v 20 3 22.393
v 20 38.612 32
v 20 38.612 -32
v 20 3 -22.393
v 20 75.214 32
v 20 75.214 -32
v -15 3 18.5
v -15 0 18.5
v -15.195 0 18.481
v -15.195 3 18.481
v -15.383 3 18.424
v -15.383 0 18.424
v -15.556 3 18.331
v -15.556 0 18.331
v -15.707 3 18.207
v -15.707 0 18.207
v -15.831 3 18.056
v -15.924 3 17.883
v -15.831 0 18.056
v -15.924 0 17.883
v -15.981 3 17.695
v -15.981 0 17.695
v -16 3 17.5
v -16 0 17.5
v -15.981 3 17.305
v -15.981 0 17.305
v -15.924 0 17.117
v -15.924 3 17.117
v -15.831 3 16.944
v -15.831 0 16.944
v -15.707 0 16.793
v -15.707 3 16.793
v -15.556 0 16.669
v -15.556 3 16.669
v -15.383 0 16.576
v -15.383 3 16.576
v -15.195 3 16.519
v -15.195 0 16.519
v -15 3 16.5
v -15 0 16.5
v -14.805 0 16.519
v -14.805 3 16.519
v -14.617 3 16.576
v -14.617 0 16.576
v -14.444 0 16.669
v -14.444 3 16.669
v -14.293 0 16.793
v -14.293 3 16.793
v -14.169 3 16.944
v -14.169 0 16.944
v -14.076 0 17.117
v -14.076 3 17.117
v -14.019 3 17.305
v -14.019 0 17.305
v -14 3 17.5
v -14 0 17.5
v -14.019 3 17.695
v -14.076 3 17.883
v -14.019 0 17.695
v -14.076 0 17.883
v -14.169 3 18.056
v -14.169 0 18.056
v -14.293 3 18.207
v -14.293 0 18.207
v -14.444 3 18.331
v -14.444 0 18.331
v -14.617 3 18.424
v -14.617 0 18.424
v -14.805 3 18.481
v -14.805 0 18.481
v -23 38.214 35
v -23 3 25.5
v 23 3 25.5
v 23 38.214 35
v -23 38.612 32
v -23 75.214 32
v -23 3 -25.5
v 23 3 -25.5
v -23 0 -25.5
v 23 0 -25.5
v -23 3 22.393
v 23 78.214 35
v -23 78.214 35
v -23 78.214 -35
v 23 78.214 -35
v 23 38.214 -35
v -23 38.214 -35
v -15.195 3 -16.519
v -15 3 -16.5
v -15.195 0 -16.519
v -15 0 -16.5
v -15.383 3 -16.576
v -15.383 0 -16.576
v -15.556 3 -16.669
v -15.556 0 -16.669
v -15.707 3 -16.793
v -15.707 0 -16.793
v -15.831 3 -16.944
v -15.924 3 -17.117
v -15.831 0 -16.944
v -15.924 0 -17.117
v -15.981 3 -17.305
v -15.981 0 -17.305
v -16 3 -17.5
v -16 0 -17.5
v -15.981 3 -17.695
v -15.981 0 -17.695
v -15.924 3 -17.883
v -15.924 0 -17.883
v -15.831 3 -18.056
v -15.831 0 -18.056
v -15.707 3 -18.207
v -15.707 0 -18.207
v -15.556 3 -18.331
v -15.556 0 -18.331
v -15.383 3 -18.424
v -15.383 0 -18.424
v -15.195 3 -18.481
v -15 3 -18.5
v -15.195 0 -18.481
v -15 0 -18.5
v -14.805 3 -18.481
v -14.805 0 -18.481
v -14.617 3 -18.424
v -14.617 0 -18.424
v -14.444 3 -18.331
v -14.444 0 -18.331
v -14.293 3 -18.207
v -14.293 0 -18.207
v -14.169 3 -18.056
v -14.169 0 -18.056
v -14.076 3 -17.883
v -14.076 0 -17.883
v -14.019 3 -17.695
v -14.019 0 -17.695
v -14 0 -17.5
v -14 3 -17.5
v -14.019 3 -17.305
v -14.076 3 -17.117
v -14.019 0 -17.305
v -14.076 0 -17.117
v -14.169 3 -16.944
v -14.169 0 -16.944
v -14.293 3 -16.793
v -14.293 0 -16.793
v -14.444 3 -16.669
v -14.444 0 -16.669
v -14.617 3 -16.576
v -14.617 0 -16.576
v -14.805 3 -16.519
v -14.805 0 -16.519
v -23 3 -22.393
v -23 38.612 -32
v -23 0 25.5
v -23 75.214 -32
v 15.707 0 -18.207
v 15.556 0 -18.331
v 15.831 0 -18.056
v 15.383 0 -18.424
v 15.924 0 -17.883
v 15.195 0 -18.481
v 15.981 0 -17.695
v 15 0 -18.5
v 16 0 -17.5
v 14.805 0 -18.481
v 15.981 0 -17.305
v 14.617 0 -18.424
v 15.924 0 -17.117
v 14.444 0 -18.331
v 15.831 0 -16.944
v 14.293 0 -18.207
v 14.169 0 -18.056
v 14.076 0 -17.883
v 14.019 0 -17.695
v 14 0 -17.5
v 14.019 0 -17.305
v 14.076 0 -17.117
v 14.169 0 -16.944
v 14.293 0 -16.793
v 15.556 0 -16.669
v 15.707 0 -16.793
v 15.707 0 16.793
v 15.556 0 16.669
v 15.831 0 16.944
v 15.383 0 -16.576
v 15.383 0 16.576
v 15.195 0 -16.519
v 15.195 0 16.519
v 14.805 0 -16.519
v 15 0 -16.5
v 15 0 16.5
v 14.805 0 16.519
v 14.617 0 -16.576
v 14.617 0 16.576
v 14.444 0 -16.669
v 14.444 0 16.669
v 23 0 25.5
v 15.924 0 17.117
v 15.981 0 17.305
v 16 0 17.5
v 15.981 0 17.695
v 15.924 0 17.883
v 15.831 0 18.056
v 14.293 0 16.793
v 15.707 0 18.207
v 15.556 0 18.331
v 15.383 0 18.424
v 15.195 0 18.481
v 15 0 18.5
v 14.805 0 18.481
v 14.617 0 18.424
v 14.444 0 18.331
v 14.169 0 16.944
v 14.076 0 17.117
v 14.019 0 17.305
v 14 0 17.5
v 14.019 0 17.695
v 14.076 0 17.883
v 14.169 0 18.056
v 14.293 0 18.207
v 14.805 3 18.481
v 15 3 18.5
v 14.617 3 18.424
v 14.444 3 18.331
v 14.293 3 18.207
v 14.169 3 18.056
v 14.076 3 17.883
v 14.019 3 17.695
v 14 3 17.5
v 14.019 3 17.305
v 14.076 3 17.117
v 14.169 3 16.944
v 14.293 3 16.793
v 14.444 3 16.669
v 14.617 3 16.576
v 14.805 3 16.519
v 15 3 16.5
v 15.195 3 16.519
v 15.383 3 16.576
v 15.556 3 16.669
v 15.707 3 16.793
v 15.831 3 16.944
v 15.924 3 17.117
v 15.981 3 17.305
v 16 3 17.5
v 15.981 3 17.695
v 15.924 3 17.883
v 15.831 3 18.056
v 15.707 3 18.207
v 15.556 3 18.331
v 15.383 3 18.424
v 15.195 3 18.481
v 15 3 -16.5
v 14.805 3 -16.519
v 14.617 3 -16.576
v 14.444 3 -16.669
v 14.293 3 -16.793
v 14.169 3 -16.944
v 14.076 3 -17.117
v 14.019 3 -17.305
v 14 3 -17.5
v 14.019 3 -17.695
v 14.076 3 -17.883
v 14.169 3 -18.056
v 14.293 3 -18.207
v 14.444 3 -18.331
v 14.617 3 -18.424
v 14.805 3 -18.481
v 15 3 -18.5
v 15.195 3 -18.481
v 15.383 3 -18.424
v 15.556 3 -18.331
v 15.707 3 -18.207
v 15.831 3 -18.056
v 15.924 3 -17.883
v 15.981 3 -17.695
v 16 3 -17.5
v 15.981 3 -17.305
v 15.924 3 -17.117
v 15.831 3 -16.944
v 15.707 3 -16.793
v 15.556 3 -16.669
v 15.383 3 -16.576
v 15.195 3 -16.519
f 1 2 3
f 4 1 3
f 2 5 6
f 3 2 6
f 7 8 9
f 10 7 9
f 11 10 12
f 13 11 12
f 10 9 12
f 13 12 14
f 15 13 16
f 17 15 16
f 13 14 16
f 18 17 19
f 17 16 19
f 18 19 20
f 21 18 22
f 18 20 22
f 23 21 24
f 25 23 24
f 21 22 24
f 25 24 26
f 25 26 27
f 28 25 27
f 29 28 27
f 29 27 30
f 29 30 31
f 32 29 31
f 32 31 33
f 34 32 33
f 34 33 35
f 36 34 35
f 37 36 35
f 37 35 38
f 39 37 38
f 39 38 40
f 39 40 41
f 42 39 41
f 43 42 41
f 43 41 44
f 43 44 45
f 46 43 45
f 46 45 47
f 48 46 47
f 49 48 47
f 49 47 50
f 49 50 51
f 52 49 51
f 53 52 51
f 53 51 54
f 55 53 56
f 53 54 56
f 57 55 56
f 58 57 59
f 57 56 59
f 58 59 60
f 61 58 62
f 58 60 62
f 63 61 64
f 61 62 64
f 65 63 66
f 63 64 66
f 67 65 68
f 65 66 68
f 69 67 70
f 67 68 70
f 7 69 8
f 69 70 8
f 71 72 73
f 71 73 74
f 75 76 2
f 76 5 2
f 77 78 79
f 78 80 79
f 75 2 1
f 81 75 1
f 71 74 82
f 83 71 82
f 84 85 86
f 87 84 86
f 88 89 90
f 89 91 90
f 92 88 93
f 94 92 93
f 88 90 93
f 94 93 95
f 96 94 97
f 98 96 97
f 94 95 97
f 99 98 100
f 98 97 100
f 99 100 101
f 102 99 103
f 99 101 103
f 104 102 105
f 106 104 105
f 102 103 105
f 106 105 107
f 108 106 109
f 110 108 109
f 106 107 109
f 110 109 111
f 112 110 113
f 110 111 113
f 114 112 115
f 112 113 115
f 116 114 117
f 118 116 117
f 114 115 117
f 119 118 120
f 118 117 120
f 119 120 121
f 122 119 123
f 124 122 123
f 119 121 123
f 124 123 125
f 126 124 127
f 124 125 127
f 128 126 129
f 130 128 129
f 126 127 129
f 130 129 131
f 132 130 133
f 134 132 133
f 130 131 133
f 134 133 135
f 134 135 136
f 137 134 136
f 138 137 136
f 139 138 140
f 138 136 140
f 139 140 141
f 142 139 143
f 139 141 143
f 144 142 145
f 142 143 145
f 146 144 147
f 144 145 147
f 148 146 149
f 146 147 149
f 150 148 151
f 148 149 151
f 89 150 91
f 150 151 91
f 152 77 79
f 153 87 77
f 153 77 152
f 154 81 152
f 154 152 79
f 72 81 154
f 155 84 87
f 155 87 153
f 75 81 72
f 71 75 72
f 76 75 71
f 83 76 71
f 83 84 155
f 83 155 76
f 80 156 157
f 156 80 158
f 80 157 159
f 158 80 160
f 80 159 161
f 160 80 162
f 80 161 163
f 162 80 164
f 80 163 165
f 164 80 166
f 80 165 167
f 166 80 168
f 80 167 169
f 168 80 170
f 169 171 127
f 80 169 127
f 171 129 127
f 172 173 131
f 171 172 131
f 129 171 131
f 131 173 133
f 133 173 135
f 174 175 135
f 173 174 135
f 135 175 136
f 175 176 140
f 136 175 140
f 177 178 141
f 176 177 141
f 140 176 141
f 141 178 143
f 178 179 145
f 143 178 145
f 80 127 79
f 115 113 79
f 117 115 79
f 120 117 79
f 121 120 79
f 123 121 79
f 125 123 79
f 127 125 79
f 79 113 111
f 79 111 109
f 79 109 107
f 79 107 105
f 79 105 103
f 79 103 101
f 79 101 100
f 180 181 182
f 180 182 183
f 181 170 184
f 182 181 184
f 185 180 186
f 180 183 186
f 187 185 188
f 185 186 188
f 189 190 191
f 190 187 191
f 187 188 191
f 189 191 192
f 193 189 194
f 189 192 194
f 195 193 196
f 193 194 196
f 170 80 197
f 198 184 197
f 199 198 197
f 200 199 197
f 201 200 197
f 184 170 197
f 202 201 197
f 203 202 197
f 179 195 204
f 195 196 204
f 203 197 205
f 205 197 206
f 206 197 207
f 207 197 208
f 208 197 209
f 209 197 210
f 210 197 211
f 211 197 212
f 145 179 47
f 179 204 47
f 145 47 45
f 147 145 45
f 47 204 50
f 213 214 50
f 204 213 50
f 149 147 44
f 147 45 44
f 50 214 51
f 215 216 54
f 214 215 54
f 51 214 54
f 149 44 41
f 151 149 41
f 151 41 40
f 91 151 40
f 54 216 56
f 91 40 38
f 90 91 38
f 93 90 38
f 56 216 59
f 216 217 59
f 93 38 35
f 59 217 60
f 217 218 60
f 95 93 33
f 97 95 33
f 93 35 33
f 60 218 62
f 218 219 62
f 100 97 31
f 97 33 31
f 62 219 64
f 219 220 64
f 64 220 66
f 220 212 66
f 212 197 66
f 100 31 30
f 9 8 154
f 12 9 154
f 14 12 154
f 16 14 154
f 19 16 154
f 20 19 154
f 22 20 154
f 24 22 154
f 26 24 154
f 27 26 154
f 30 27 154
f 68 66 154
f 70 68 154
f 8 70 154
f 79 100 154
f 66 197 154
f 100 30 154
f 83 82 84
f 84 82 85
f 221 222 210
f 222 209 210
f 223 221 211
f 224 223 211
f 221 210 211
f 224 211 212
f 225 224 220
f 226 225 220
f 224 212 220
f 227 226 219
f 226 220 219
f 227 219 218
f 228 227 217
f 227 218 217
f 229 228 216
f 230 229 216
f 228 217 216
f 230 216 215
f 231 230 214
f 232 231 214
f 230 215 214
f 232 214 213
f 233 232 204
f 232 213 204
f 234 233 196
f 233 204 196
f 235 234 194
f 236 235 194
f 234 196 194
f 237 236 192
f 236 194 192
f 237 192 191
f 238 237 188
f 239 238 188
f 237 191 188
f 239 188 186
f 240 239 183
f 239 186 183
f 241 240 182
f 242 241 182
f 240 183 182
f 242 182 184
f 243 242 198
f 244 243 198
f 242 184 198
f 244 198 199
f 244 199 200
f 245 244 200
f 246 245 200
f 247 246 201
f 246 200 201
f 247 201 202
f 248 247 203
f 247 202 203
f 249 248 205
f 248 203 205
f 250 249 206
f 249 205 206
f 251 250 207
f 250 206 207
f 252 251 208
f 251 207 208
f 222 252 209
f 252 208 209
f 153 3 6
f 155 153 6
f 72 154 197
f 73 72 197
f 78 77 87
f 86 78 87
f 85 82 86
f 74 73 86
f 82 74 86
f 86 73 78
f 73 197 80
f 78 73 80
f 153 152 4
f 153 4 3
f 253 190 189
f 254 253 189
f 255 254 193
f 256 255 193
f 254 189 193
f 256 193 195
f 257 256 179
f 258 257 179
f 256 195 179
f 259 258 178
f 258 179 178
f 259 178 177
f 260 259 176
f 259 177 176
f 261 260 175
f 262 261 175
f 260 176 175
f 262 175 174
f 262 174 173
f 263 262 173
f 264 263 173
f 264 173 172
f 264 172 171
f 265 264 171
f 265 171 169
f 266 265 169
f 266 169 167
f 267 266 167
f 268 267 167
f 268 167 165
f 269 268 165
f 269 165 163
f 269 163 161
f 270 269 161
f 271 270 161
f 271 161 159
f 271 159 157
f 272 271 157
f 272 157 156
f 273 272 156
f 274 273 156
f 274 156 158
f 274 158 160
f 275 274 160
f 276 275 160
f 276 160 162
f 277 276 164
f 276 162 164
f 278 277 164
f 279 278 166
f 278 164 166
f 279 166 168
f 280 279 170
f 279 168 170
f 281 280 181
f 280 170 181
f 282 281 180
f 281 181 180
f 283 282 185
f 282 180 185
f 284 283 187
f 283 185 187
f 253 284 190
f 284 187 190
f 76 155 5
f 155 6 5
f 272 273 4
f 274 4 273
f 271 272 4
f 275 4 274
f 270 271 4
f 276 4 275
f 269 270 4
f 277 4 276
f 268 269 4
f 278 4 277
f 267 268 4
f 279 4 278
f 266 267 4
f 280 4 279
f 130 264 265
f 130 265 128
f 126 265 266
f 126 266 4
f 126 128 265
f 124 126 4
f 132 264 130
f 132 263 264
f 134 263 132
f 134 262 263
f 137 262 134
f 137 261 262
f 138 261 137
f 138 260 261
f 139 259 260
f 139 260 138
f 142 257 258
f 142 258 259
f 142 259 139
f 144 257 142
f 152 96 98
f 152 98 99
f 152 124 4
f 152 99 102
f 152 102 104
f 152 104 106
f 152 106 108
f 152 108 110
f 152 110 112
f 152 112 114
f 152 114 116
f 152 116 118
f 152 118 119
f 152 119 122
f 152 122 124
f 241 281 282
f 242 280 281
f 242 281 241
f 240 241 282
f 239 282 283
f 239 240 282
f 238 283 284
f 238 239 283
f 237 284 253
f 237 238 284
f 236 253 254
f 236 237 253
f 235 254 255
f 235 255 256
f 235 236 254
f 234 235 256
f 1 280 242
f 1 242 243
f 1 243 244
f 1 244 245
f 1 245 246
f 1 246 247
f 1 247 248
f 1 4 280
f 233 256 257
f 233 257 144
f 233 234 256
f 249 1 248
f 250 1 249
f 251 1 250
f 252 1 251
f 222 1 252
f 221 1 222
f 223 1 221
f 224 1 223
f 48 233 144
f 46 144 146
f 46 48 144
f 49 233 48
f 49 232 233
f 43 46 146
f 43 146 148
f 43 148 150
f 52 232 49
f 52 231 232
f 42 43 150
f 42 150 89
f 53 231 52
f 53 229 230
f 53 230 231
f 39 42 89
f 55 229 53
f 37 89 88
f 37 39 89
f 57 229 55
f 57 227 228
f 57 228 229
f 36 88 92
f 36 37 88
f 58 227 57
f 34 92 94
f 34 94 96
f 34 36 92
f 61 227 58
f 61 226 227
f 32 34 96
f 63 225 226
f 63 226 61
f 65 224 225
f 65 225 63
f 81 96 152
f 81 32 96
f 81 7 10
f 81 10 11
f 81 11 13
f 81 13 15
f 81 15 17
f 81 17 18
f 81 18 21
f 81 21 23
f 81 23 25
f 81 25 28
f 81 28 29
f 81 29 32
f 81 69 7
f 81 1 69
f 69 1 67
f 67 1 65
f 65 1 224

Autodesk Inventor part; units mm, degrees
ref_plane "YZ Plane" through (0, 0, 0) normal (1, 0, 0) x (0, 1, 0)
ref_plane "XZ Plane" through (0, 0, 0) normal (0, 1, 0) x (-1, 0, 0)
sketch "Sketch1" plane through (0, 0, 0) normal (0, 1, 0) x (-1, 0, 0)
  line L0 (23, 25.5) -> (-23, 25.5)
  line L1 (-23, 25.5) -> (-23, -25.5)
  line L2 (-23, -25.5) -> (23, -25.5)
  line L3 (23, -25.5) -> (23, 25.5)
  point P0 (0, 0)
  point P1 (-23, 0)
  point P2 (23, 0)
  point P3 (0, 25.5)
  point P4 (0, -25.5)
  dimension "d0" = 46
  dimension "d1" = 51
extrude "Extrusion1" add sketch "Sketch1" along normal blind 3
sketch "Sketch2" plane through (0, 3, 0) normal (0, 1, 0) x (1, 0, 0)
  line L0 (-23, -25.5) -> (23, -25.5) projected
  line L1 (23, 25.5) -> (-23, 25.5) projected
  line L2 (-23, 25.5) -> (-23, -25.5) projected
  line L3 (23, -25.5) -> (23, 25.5) projected
  point P0 (0, 0)
  point P1 (-15, -17.5)
  point P2 (-15, 17.5)
  point P3 (15, -17.5)
  point P4 (15, 17.5)
  dimension "d4" = 8
  dimension "d5" = 8
  dimension "d6" = 8
  dimension "d7" = 8
  dimension "d8" = 8
  dimension "d9" = 8
  dimension "d10" = 8
  dimension "d11" = 8
hole "Hole1" at (-15, 3, 17.5) at (-15, 3, -17.5) at (15, 3, 17.5) at (15, 3, -17.5) direction (0, -1, 0) diameter 2 end through all
ref_plane "Work Plane1" through (23, 0, 25.5) normal (1, 0, 0) x (0, 0, -1)
sketch "Sketch3" plane through (23, 0, 25.5) normal (1, 0, 0) x (0, 0, -1)
  line L0 (25.5, 0) -> (25.5, 200)
  line L1 (60.5, 78.2142) -> (-9.5, 78.2142)
  line L2 (51, 3) -> (0, 3) projected
  line L3 (0, 3) -> (51, 3) projected
  line L4 (60.5, 78.2142) -> (60.5, 38.2142)
  line L5 (-9.5, 78.2142) -> (-9.5, 38.2142)
  line L6 (-9.5, 38.2142) -> (0, 3)
  line L7 (60.5, 38.2142) -> (51, 3)
  point P0 (25.5, 78.2142)
  point P1 (25.5, 3)
  point P2 (25.5, 3)
  dimension "d19" = 200
  dimension "d20" = 70
  dimension "d23" = 40
  dimension "d24" = 40
extrude "Extrusion3" add sketch "Sketch3" against normal blind 3
sketch "Sketch4" plane through (20, 0, 25.5) normal (-1, 0, 0) x (0, 0, 1)
  line L0 (-51, 3) -> (0, 3) projected
  line L1 (-60.5, 78.2142) -> (-60.5, 38.2142) projected
  line L2 (-51, 3) -> (-60.5, 38.2142)
  line L3 (9.5, 78.2142) -> (-60.5, 78.2142) projected
  line L4 (-60.5, 38.2142) -> (-60.5, 78.2142)
  line L5 (9.5, 38.2142) -> (9.5, 78.2142) projected
  line L6 (-60.5, 78.2142) -> (9.5, 78.2142)
  line L7 (0, 3) -> (9.5, 38.2142) projected
  line L8 (9.5, 78.2142) -> (9.5, 38.2142)
  line L9 (9.5, 38.2142) -> (0, 3)
  line L10 (-47.8927, 3) -> (-57.5, 38.6118)
  line L11 (-57.5, 38.6118) -> (-57.5, 75.2142)
  line L12 (-57.5, 75.2142) -> (6.5, 75.2142)
  line L13 (6.5, 75.2142) -> (6.5, 38.6118)
  line L14 (6.5, 38.6118) -> (-3.1073, 3)
  point P0 (-25.5, 0)
  dimension "d27" = 3
  dimension "d28" = 3
  dimension "d29" = 3
  dimension "d30" = 3
  dimension "d31" = 3
extrude "Extrusion4" add sketch "Sketch4" along normal blind 43 contours L2 L1 L3 L5 L7 L0 L14 L13 L12 L11 L10
equation "\"d5\" = d10"
equation "\"d6\" = d4"
equation "\"d7\" = d8"
equation "\"d8\" = d4"
equation "\"d9\" = d10"
equation "\"d10\" = d6"
equation "\"d11\" = d7"
equation "\"d27\" = d28"
equation "\"d28\" = d29"
equation "\"d29\" = d30"
equation "\"d30\" = d31"
properties part number "Upper_body_v2"
